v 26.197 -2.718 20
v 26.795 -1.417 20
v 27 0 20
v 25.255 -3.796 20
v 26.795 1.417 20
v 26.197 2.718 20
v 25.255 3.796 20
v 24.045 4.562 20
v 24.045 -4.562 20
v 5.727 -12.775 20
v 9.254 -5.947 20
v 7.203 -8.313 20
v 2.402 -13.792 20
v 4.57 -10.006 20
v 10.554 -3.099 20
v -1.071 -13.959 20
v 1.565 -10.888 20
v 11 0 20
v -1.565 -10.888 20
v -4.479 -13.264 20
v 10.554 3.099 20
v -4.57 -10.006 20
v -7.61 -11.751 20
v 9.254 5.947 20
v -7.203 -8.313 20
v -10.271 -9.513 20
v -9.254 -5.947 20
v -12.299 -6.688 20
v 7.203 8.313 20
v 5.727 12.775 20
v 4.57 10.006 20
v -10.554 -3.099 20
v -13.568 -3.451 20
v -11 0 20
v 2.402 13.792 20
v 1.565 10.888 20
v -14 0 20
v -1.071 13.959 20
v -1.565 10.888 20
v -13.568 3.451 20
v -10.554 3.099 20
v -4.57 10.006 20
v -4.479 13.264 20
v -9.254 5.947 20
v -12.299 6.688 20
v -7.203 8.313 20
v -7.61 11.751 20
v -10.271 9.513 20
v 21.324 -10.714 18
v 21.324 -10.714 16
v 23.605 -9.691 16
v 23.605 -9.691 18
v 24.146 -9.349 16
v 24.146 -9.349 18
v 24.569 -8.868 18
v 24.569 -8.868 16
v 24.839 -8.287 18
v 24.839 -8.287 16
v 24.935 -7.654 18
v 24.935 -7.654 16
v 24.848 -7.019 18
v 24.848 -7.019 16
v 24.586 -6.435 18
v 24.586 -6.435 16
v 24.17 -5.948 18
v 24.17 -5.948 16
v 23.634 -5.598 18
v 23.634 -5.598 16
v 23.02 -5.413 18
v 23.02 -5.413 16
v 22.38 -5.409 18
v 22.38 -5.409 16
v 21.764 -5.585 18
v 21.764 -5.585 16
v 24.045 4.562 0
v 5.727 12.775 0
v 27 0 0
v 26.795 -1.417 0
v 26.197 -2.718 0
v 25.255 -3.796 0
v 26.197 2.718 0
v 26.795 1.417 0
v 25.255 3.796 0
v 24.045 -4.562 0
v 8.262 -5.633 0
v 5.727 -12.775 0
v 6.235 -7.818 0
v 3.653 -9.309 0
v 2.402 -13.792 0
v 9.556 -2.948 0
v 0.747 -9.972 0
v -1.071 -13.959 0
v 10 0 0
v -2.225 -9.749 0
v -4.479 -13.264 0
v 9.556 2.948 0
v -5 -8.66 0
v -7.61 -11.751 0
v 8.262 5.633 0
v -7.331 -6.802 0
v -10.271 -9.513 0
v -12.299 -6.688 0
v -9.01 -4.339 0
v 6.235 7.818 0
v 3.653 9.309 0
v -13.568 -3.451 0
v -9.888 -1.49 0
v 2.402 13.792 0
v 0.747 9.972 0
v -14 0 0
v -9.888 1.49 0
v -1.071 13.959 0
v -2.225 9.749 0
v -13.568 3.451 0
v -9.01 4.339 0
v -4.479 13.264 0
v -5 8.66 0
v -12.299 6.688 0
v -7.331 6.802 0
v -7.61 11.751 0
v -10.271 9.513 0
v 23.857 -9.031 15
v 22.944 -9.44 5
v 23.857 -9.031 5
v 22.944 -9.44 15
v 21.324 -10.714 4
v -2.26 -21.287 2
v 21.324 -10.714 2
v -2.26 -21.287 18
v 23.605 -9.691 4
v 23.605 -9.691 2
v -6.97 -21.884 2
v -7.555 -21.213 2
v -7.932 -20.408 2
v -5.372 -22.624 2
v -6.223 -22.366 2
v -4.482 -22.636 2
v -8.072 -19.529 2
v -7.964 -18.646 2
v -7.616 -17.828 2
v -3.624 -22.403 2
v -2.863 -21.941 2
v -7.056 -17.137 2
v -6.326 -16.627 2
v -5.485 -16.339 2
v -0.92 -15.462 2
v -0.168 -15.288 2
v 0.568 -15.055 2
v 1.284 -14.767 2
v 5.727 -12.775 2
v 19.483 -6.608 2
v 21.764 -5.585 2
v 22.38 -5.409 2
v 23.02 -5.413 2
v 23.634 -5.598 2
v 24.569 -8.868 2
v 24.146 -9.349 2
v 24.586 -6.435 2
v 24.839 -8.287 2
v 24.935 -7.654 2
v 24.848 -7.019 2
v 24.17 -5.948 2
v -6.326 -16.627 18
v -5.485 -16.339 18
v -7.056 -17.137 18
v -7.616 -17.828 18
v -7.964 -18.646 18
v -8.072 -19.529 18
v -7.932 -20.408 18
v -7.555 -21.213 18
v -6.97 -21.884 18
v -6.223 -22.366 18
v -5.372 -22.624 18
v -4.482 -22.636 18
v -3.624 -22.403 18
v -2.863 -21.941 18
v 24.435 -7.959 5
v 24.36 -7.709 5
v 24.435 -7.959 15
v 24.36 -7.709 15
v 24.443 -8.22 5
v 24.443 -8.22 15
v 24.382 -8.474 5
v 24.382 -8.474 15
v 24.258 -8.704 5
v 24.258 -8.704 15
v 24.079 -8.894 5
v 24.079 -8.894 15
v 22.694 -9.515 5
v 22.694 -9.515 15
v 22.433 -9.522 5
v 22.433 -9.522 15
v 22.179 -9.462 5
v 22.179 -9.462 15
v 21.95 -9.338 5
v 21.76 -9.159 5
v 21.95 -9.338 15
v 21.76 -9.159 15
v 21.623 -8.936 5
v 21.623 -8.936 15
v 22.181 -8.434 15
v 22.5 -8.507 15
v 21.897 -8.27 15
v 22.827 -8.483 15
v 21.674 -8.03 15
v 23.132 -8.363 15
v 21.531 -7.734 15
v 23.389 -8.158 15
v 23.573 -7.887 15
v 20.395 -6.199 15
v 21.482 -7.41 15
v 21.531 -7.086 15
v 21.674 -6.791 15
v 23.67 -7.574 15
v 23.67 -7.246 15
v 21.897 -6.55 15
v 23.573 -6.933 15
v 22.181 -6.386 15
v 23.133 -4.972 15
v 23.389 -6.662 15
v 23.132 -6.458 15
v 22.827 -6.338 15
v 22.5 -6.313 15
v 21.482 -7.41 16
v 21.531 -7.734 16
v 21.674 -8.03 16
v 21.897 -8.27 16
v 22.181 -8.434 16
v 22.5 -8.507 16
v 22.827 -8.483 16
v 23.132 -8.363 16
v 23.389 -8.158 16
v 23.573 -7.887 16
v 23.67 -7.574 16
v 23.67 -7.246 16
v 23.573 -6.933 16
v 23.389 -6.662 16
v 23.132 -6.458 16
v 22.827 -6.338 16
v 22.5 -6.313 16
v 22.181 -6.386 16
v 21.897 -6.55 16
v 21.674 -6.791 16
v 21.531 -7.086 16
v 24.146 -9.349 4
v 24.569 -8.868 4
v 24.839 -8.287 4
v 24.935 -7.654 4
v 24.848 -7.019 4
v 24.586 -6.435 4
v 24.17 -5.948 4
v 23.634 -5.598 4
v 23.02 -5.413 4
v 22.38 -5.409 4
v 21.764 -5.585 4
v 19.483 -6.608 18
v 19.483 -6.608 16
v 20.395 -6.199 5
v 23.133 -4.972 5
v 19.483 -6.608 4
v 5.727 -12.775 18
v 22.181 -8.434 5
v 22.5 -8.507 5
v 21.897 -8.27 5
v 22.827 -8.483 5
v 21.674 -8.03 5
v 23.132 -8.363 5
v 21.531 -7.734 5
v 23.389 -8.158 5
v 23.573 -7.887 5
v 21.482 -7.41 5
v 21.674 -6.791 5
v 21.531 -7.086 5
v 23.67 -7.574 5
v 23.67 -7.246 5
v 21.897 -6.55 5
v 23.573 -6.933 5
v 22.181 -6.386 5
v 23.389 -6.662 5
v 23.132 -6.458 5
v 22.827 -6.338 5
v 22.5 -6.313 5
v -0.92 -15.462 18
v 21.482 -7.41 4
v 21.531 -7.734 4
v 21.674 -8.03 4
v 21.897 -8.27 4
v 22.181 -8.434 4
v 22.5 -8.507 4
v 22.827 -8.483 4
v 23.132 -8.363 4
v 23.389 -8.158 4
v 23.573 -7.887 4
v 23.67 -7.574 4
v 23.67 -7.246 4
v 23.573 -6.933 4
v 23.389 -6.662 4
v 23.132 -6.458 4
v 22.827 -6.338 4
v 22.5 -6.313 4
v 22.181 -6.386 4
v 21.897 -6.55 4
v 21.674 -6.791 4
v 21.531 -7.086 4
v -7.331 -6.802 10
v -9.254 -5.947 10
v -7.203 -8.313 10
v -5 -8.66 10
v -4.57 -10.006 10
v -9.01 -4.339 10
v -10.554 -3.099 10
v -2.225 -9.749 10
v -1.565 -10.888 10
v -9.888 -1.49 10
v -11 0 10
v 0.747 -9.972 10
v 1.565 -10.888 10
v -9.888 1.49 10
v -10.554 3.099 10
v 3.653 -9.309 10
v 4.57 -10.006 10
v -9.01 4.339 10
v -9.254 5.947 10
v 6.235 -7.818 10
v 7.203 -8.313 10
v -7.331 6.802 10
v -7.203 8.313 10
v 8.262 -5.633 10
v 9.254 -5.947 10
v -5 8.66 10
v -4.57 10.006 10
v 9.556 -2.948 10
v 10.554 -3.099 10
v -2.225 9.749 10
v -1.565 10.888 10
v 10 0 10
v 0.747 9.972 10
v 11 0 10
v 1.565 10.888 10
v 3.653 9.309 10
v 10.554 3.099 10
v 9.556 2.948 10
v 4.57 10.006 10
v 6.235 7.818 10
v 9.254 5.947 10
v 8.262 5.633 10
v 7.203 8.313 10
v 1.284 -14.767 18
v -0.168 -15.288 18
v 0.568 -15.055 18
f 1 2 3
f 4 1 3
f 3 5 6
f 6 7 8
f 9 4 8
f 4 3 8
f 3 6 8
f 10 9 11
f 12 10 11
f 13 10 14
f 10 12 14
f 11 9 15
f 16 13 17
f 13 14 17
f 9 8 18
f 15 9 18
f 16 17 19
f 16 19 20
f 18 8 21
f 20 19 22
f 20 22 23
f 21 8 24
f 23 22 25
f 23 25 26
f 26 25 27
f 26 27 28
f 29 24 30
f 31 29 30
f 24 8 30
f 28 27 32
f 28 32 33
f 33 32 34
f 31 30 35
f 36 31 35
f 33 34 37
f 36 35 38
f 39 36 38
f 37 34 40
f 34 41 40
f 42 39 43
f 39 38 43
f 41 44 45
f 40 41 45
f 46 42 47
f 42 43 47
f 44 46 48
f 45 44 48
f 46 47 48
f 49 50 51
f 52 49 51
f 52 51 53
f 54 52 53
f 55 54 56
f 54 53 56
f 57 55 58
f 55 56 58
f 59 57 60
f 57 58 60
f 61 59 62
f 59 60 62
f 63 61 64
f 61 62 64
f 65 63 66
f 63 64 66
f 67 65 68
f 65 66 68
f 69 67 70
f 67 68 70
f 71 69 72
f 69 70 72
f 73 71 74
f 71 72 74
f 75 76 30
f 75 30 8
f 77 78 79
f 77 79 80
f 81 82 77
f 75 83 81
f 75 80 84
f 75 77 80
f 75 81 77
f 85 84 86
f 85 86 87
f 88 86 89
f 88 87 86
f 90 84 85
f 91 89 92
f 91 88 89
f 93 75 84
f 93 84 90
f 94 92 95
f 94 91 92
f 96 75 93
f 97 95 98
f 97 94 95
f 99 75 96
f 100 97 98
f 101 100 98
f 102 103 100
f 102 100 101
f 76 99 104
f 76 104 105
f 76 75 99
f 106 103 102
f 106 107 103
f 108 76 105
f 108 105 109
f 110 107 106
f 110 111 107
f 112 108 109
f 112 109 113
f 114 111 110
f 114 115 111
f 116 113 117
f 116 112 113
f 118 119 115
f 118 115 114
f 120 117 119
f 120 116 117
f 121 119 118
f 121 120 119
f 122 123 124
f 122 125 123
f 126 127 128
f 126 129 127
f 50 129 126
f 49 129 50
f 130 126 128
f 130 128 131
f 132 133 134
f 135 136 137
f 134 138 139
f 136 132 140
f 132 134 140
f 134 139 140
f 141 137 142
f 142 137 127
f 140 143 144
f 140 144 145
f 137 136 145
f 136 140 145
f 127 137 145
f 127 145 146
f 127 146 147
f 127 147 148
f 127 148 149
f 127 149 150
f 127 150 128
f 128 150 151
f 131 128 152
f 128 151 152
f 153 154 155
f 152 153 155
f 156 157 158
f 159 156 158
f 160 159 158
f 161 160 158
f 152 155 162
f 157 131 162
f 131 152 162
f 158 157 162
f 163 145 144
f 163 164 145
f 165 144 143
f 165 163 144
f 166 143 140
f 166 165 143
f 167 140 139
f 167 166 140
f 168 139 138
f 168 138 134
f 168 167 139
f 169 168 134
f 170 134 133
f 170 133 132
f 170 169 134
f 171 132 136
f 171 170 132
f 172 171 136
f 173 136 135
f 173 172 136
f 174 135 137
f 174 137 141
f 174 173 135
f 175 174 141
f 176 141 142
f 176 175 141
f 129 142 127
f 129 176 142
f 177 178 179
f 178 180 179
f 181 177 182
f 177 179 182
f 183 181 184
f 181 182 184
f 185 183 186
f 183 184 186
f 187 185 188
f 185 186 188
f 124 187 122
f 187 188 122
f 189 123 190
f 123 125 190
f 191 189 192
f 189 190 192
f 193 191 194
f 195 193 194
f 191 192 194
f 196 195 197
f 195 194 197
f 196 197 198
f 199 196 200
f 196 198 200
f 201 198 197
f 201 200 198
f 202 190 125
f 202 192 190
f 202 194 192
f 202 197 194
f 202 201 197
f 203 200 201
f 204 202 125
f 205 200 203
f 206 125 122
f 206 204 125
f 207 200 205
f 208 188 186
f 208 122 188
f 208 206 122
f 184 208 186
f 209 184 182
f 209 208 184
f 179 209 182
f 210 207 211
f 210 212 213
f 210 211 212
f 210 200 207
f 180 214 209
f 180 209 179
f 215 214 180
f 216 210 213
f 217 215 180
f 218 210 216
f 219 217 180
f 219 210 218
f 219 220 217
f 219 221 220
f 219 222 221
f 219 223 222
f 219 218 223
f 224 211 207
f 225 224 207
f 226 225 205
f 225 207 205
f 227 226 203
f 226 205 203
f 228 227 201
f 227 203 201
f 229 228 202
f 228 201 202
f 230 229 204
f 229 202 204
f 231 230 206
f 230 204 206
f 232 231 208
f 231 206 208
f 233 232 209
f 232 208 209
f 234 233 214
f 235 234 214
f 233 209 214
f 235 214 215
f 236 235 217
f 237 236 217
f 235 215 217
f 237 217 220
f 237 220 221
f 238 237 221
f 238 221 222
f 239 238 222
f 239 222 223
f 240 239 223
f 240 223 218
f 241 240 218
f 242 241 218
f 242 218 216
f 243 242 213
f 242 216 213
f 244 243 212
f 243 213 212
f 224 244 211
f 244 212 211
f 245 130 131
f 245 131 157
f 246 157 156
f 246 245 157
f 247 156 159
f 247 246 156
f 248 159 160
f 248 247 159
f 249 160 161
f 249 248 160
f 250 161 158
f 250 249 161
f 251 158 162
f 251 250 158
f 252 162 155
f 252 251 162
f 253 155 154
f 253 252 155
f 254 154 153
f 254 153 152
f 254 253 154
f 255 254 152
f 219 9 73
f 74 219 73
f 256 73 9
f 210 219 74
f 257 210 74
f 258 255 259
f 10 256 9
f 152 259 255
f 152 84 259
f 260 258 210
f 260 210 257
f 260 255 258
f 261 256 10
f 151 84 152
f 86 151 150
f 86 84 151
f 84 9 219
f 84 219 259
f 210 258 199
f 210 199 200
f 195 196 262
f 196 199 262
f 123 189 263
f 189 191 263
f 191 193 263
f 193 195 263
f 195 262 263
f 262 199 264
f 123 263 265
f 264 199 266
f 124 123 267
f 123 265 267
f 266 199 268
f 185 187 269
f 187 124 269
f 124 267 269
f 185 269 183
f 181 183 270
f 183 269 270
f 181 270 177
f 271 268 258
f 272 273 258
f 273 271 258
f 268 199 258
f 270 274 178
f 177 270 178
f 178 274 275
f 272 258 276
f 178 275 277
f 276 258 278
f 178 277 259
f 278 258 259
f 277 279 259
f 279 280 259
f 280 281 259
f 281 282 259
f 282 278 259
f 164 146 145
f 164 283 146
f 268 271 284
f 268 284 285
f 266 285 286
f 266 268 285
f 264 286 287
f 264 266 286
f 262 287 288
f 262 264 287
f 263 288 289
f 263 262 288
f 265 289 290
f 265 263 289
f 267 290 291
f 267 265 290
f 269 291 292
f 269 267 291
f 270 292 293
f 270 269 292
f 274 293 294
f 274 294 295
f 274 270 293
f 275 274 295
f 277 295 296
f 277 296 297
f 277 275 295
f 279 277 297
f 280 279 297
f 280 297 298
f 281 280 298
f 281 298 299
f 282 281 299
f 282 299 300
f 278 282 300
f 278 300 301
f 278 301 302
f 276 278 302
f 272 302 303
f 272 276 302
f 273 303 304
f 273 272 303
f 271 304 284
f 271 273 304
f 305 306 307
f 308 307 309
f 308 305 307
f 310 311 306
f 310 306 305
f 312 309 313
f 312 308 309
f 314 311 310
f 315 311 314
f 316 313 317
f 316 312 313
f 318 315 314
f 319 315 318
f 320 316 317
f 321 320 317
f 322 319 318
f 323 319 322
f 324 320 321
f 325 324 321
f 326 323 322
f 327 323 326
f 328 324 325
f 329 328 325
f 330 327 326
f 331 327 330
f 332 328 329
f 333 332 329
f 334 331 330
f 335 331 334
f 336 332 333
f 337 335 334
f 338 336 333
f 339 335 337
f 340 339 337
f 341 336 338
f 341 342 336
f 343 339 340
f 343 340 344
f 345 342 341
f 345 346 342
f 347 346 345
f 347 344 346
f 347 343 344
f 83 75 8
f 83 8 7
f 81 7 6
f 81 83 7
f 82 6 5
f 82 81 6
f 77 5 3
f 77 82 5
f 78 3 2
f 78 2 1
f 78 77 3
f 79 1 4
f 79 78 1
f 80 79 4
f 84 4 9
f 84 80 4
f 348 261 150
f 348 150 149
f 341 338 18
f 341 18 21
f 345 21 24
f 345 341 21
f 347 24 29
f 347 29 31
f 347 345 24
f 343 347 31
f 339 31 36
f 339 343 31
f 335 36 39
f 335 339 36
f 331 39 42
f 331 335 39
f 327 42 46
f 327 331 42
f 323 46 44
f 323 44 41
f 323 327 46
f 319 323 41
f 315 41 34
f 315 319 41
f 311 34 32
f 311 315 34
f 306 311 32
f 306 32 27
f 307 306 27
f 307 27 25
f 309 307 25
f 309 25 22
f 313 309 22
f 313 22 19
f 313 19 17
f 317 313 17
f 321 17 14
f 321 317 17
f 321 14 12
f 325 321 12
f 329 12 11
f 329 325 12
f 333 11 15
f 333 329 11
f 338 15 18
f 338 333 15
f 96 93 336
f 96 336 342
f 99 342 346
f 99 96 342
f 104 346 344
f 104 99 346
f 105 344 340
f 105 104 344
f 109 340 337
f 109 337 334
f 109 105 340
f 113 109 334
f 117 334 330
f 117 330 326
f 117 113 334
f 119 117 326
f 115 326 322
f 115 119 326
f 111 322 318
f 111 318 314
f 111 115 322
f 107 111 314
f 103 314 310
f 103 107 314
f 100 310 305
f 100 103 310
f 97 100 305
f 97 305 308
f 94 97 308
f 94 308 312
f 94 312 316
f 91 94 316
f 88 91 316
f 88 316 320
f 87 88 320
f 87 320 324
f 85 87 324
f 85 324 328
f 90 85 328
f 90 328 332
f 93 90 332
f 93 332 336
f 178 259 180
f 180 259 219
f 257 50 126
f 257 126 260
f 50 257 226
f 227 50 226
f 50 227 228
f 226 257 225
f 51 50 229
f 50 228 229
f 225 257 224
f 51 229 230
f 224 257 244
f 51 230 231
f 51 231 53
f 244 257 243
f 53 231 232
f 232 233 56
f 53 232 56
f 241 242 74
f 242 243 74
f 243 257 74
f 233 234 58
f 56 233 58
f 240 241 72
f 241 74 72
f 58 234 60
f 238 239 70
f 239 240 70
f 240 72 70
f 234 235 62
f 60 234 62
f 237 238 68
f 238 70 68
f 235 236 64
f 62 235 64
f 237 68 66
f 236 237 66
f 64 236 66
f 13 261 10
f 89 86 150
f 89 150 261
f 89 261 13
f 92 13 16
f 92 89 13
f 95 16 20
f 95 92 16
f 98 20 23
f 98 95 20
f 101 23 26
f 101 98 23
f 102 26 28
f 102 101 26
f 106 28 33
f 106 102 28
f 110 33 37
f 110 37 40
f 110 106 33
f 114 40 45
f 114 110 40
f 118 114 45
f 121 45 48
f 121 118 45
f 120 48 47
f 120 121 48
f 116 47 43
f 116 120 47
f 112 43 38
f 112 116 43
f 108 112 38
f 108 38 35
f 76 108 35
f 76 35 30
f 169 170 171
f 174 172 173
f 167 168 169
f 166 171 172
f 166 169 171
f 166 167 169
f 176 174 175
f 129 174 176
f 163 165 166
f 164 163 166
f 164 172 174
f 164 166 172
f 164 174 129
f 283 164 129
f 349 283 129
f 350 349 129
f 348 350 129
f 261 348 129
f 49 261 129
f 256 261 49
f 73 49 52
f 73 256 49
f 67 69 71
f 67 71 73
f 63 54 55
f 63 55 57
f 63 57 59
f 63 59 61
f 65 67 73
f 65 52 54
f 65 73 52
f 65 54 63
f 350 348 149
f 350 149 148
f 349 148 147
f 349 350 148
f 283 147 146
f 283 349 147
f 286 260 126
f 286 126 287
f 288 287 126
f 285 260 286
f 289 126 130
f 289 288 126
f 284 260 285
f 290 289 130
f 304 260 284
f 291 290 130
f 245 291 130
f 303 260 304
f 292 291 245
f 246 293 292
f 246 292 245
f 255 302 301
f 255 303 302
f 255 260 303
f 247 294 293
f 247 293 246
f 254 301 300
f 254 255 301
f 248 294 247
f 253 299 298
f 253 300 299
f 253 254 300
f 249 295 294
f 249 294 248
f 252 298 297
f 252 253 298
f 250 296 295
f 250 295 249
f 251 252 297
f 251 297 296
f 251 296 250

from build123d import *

# Parameters (mm, degrees)
ESQUISSE2_R             = 10
BOSS_EXTRU_1_DEPTH      = 20
ENL_V_START             = -10
ESQUISSE3_R             = 11
ESQUISSE3_R_2           = 10
ENL_V_MAT_EXTRU_1_DEPTH = 10
ESQUISSE4_W             = 3
ESQUISSE4_H             = 10
BOSS_EXTRU_2_DEPTH      = 4
ESQUISSE5_R             = 1.1
BOSS_EXTRU_3_DEPTH      = 1
ESQUISSE9_R             = 1.1
BOSS_EXTRU_5_DEPTH      = 2
BOSS_EXTRU_6_START      = -6
BOSS_EXTRU_6_DEPTH      = 8
CONG_1_R                = 1
CONG_2_R                = 1


with BuildPart() as part:
    # Esquisse2 → Boss.-Extru.1 (new body)
    with BuildSketch(Plane.XY):
        with BuildLine():
            Line((5.727272727, 12.774910845), (24.045454545, 4.562468159))
            ThreePointArc((24.045454545, 4.562468159), (27, 0), (24.045454545, -4.562468159))
            Line((24.045454545, -4.562468159), (5.727272727, -12.774910845))
            ThreePointArc((5.727272727, -12.774910845), (-14, 0), (5.727272727, 12.774910845))
        make_face()
        Circle(ESQUISSE2_R, mode=Mode.SUBTRACT)
    extrude(amount=BOSS_EXTRU_1_DEPTH)

    # Esquisse3 → Enlèv. mat.-Extru.1 (cut)
    with BuildSketch(Plane.XY.offset(20).offset(ENL_V_START)):
        Circle(ESQUISSE3_R)
        Circle(ESQUISSE3_R_2, mode=Mode.SUBTRACT)
    extrude(amount=ENL_V_MAT_EXTRU_1_DEPTH, mode=Mode.SUBTRACT)

    # Esquisse4 → Boss.-Extru.2 (add)
    with BuildSketch(Plane(origin=(5.727272727, -12.774910845, 0), x_dir=(0.9124936318129423, 0.4090909090909094, 0), z_dir=(0.40909090909090934, -0.9124936318129422, 0))):
        with Locations((17.5748599, 10)):
            Rectangle(ESQUISSE4_W, ESQUISSE4_H)
    extrude(amount=BOSS_EXTRU_2_DEPTH)

    # Esquisse5 → Boss.-Extru.3 (add)
    with BuildSketch(Plane.XY.offset(15)):
        with Locations(Location((22.582402284, -7.410182695, 0), (0, 0, 180))):
            Circle(ESQUISSE5_R)
    boss_extru_3 = extrude(amount=BOSS_EXTRU_3_DEPTH)

    # Symétrie1: Boss.-Extru.3 across plane
    add(boss_extru_3.mirror(Plane.XY.offset(10)))

    # Esquisse9 → Boss.-Extru.5 (add)
    # profile 1 of 2: a face of its own
    with BuildSketch(Plane.XY.offset(16)):
        with BuildLine():
            Line((21.323895477, -10.714144048), (23.605129557, -9.691416775))
            ThreePointArc((23.605129557, -9.691416775), (24.737785683, -6.717851558), (21.764220466, -5.585195432))
            Line((21.764220466, -5.585195432), (19.482986386, -6.607922705))
            Line((19.482986386, -6.607922705), (21.323895477, -10.714144048))
        make_face()
        with Locations(Location((22.582402284, -7.410182695, 0), (0, 0, 180))):
            Circle(ESQUISSE9_R, mode=Mode.SUBTRACT)
    # profile 2 of 2: a face of its own
    with BuildSketch(Plane.XY.offset(16)):
        with Locations(Location((22.582402284, -7.410182695, 0), (0, 0, 180))):
            Circle(ESQUISSE9_R)
    boss_extru_5 = extrude(amount=BOSS_EXTRU_5_DEPTH)

    # Esquisse9<4> → Boss.-Extru.6 (add)
    with BuildSketch(Plane.XY.offset(16).offset(BOSS_EXTRU_6_START)):
        with BuildLine():
            Line((-2.260153649, -21.287390546), (21.323895477, -10.714144048))
            Line((21.323895477, -10.714144048), (19.482986386, -6.607922705))
            Line((19.482986386, -6.607922705), (1.283727254, -14.767049742))
            ThreePointArc((1.283727254, -14.767049742), (0.201847525, -15.178661138), (-0.920349818, -15.462493505))
            Line((-0.920349818, -15.462493505), (-5.484659611, -16.339454049))
            ThreePointArc((-5.484659611, -16.339454049), (-7.55515779, -21.213423405), (-2.260153649, -21.287390546))
        make_face()
    boss_extru_6 = extrude(amount=BOSS_EXTRU_6_DEPTH)

    # Symétrie2: Boss.-Extru.5, Boss.-Extru.6 across plane
    add(boss_extru_5.mirror(Plane.XY.offset(10)))
    add(boss_extru_6.mirror(Plane.XY.offset(10)))

    # Congé1
    cong_1_edges = [part.edges().sort_by_distance(p)[0] for p in [
        (24.76932455, -8.621533595, 10),
    ]]
    fillet(cong_1_edges, radius=CONG_1_R)

    # Congé2
    cong_2_edges = [part.edges().sort_by_distance(p)[0] for p in [
        (22.031843655, -9.848806323, 10),
    ]]
    fillet(cong_2_edges, radius=CONG_2_R)


solid = part.part
